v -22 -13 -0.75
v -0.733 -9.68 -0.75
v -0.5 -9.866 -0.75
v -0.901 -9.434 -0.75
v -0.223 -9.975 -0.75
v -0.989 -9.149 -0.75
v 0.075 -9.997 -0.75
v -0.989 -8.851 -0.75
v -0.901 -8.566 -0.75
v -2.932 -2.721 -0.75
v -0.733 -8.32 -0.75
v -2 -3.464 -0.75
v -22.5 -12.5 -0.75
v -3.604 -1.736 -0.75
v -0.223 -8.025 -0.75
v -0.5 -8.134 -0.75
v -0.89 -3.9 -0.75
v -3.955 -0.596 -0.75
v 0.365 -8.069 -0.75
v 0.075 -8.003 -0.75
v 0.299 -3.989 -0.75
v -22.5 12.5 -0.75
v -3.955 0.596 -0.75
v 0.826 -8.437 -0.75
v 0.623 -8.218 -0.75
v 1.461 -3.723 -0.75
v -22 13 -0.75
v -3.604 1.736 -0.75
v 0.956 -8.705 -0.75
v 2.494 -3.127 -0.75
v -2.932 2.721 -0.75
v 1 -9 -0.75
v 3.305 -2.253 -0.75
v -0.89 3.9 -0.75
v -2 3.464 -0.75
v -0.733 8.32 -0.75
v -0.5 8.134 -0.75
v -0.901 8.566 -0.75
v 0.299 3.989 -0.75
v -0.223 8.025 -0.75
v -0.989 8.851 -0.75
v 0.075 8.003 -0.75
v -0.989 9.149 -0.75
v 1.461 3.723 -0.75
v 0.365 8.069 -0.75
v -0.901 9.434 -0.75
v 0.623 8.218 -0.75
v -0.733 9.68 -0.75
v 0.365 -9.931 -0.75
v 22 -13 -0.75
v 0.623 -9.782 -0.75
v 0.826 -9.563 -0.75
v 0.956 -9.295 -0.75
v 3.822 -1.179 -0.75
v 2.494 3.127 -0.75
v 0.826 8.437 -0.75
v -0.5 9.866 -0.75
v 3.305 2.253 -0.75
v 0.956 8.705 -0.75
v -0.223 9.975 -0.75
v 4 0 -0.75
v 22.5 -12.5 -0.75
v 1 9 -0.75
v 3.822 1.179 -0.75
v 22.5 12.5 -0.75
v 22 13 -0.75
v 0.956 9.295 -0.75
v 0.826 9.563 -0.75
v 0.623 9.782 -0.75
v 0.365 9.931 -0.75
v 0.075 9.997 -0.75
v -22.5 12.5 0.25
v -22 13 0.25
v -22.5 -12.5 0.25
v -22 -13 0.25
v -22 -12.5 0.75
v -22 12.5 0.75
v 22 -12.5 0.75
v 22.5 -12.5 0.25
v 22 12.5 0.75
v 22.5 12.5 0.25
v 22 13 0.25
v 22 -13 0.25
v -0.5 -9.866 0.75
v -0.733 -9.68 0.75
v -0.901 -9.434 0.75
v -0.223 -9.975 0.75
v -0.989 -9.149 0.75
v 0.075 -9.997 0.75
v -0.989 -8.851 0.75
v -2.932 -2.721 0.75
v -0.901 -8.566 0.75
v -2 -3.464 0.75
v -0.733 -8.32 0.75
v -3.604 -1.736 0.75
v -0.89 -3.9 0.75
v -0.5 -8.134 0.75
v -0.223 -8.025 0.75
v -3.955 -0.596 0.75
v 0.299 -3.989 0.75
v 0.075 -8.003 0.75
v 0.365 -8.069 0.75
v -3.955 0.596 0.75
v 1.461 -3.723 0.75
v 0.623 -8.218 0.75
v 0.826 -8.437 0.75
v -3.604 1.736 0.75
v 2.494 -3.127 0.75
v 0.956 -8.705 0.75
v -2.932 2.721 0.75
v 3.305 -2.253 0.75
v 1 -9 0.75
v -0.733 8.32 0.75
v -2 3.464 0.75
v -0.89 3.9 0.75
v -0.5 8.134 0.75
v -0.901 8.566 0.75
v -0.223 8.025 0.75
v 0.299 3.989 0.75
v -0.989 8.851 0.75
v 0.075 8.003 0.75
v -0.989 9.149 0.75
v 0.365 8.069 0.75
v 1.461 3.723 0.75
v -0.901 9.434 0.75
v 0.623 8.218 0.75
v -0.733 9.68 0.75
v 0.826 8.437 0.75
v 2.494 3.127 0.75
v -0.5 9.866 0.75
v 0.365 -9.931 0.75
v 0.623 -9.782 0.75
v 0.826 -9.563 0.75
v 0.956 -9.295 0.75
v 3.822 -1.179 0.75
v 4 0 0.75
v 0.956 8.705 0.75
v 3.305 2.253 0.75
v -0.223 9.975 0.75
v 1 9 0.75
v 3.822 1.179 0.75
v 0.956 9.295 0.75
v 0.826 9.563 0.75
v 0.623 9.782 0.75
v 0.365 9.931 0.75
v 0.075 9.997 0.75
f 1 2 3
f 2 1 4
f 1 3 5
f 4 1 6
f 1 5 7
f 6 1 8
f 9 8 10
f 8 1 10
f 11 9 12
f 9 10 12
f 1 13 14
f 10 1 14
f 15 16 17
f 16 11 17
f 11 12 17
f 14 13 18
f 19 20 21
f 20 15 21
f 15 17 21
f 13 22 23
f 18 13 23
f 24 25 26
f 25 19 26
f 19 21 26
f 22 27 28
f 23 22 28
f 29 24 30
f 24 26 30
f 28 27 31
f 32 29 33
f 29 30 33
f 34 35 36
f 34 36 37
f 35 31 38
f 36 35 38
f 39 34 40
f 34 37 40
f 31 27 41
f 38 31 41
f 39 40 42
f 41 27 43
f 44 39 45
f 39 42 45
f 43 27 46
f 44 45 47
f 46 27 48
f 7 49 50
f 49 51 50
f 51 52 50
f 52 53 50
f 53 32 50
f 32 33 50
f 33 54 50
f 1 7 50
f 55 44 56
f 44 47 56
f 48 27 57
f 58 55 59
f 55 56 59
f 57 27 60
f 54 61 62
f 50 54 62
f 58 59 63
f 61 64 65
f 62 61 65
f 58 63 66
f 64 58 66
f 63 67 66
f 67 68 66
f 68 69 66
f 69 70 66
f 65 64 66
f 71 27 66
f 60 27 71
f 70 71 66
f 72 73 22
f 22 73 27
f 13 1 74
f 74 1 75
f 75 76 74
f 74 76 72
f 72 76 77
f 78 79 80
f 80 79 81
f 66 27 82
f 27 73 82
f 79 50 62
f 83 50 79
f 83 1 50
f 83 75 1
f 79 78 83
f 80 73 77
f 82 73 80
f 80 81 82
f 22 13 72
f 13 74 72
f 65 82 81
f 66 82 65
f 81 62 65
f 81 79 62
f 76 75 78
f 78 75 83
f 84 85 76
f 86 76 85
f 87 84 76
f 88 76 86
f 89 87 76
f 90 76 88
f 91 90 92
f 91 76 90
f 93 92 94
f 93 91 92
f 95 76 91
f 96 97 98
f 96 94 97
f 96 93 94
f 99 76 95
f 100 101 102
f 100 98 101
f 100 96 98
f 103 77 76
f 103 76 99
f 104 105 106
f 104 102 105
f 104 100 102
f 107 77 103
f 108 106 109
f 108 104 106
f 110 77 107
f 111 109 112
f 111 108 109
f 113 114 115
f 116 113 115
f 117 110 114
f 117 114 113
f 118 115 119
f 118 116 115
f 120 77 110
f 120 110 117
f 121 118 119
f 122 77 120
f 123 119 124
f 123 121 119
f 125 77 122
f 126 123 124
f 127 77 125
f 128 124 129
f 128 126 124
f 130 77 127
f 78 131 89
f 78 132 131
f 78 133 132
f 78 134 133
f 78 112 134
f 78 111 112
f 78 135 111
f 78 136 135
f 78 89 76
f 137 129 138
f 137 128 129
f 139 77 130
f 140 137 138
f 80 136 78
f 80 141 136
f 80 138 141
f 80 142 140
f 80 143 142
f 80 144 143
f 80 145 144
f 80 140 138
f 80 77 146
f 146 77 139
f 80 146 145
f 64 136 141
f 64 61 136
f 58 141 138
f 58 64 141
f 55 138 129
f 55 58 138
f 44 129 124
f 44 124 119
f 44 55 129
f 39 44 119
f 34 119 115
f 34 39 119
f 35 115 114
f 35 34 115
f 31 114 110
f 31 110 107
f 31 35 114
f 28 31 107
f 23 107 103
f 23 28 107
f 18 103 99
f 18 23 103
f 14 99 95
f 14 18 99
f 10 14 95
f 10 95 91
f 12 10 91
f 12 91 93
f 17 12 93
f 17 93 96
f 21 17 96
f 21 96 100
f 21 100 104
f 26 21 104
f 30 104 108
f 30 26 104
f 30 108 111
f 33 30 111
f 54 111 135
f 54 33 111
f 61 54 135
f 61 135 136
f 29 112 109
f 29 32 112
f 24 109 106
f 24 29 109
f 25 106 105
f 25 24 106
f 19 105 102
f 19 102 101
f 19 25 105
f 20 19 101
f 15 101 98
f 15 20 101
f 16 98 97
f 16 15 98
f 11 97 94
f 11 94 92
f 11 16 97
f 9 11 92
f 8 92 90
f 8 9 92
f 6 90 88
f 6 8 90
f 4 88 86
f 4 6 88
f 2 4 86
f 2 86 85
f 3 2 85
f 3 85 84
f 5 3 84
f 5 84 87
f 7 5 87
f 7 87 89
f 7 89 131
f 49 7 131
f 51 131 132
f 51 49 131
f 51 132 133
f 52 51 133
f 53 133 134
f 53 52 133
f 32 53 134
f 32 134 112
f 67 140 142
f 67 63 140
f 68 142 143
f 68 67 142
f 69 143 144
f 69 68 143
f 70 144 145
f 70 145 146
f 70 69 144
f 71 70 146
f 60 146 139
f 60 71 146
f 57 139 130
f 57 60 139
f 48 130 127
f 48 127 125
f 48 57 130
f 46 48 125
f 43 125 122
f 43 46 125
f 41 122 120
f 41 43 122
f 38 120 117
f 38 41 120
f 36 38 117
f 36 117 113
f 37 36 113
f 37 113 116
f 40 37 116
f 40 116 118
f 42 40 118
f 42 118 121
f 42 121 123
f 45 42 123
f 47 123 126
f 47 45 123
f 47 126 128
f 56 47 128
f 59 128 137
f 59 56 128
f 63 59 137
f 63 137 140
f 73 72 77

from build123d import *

# Parameters (mm, degrees)
SKETCH1_W           = 45
SKETCH1_H           = 26
SKETCH1_R           = 4
SKETCH1_R_2         = 1
BOSS_EXTRUDE1_DEPTH = 0.75
CHAMFER1_SIZE       = 0.5


with BuildPart() as part:
    # Sketch1 → Boss-Extrude1 (new body, symmetric)
    with BuildSketch(Plane.XY):
        Rectangle(SKETCH1_W, SKETCH1_H)
        Circle(SKETCH1_R, mode=Mode.SUBTRACT)
        with Locations((0, 9)):
            Circle(SKETCH1_R_2, mode=Mode.SUBTRACT)
        with Locations((0, -9)):
            Circle(SKETCH1_R_2, mode=Mode.SUBTRACT)
    extrude(amount=BOSS_EXTRUDE1_DEPTH, both=True)

    # Chamfer1
    chamfer1_edges = [part.edges().sort_by_distance(p)[0] for p in [
        (-22.5, 0, 0.75),
        (0, -13, 0.75),
        (22.5, 0, 0.75),
        (22.5, -13, 0),
        (-22.5, -13, 0),
        (-22.5, 13, 0),
        (22.5, 13, 0),
        (0, 13, 0.75),
    ]]
    chamfer(chamfer1_edges, length=CHAMFER1_SIZE)


solid = part.part
